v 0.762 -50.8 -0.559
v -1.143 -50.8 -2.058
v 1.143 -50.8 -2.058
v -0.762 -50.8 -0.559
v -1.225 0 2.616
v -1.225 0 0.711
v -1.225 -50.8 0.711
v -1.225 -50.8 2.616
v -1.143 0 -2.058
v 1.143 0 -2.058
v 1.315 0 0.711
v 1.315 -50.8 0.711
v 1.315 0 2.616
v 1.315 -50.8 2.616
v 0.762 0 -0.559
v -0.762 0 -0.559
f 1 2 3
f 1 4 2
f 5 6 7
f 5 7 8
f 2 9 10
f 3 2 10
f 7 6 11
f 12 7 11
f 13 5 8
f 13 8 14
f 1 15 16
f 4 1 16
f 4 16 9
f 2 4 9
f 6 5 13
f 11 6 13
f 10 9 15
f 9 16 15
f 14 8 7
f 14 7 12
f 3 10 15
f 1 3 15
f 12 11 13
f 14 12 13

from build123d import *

# Parameters (mm, degrees)
F2_DEPTH = 50.8
F1_W     = 2.54
F1_H     = 1.905
F3_DEPTH = 50.8


with BuildPart() as f2:
    # F0 (on Front) → F2 (new body)
    with BuildSketch(Plane.XZ):
        Polygon((-1.143, -2.057626), (0, -2.057626), (1.143, -2.057626), (0.762, -0.559026), (0, -0.559026), (-0.762, -0.559026), align=None)
    extrude(amount=F2_DEPTH)


with BuildPart() as f3:
    # F1 (on Front) → F3 (new body)
    with BuildSketch(Plane.XZ):
        with Locations((0.045043, 1.663474)):
            Rectangle(F1_W, F1_H)
    extrude(amount=F3_DEPTH)


solid = Compound([f2.part, f3.part])
